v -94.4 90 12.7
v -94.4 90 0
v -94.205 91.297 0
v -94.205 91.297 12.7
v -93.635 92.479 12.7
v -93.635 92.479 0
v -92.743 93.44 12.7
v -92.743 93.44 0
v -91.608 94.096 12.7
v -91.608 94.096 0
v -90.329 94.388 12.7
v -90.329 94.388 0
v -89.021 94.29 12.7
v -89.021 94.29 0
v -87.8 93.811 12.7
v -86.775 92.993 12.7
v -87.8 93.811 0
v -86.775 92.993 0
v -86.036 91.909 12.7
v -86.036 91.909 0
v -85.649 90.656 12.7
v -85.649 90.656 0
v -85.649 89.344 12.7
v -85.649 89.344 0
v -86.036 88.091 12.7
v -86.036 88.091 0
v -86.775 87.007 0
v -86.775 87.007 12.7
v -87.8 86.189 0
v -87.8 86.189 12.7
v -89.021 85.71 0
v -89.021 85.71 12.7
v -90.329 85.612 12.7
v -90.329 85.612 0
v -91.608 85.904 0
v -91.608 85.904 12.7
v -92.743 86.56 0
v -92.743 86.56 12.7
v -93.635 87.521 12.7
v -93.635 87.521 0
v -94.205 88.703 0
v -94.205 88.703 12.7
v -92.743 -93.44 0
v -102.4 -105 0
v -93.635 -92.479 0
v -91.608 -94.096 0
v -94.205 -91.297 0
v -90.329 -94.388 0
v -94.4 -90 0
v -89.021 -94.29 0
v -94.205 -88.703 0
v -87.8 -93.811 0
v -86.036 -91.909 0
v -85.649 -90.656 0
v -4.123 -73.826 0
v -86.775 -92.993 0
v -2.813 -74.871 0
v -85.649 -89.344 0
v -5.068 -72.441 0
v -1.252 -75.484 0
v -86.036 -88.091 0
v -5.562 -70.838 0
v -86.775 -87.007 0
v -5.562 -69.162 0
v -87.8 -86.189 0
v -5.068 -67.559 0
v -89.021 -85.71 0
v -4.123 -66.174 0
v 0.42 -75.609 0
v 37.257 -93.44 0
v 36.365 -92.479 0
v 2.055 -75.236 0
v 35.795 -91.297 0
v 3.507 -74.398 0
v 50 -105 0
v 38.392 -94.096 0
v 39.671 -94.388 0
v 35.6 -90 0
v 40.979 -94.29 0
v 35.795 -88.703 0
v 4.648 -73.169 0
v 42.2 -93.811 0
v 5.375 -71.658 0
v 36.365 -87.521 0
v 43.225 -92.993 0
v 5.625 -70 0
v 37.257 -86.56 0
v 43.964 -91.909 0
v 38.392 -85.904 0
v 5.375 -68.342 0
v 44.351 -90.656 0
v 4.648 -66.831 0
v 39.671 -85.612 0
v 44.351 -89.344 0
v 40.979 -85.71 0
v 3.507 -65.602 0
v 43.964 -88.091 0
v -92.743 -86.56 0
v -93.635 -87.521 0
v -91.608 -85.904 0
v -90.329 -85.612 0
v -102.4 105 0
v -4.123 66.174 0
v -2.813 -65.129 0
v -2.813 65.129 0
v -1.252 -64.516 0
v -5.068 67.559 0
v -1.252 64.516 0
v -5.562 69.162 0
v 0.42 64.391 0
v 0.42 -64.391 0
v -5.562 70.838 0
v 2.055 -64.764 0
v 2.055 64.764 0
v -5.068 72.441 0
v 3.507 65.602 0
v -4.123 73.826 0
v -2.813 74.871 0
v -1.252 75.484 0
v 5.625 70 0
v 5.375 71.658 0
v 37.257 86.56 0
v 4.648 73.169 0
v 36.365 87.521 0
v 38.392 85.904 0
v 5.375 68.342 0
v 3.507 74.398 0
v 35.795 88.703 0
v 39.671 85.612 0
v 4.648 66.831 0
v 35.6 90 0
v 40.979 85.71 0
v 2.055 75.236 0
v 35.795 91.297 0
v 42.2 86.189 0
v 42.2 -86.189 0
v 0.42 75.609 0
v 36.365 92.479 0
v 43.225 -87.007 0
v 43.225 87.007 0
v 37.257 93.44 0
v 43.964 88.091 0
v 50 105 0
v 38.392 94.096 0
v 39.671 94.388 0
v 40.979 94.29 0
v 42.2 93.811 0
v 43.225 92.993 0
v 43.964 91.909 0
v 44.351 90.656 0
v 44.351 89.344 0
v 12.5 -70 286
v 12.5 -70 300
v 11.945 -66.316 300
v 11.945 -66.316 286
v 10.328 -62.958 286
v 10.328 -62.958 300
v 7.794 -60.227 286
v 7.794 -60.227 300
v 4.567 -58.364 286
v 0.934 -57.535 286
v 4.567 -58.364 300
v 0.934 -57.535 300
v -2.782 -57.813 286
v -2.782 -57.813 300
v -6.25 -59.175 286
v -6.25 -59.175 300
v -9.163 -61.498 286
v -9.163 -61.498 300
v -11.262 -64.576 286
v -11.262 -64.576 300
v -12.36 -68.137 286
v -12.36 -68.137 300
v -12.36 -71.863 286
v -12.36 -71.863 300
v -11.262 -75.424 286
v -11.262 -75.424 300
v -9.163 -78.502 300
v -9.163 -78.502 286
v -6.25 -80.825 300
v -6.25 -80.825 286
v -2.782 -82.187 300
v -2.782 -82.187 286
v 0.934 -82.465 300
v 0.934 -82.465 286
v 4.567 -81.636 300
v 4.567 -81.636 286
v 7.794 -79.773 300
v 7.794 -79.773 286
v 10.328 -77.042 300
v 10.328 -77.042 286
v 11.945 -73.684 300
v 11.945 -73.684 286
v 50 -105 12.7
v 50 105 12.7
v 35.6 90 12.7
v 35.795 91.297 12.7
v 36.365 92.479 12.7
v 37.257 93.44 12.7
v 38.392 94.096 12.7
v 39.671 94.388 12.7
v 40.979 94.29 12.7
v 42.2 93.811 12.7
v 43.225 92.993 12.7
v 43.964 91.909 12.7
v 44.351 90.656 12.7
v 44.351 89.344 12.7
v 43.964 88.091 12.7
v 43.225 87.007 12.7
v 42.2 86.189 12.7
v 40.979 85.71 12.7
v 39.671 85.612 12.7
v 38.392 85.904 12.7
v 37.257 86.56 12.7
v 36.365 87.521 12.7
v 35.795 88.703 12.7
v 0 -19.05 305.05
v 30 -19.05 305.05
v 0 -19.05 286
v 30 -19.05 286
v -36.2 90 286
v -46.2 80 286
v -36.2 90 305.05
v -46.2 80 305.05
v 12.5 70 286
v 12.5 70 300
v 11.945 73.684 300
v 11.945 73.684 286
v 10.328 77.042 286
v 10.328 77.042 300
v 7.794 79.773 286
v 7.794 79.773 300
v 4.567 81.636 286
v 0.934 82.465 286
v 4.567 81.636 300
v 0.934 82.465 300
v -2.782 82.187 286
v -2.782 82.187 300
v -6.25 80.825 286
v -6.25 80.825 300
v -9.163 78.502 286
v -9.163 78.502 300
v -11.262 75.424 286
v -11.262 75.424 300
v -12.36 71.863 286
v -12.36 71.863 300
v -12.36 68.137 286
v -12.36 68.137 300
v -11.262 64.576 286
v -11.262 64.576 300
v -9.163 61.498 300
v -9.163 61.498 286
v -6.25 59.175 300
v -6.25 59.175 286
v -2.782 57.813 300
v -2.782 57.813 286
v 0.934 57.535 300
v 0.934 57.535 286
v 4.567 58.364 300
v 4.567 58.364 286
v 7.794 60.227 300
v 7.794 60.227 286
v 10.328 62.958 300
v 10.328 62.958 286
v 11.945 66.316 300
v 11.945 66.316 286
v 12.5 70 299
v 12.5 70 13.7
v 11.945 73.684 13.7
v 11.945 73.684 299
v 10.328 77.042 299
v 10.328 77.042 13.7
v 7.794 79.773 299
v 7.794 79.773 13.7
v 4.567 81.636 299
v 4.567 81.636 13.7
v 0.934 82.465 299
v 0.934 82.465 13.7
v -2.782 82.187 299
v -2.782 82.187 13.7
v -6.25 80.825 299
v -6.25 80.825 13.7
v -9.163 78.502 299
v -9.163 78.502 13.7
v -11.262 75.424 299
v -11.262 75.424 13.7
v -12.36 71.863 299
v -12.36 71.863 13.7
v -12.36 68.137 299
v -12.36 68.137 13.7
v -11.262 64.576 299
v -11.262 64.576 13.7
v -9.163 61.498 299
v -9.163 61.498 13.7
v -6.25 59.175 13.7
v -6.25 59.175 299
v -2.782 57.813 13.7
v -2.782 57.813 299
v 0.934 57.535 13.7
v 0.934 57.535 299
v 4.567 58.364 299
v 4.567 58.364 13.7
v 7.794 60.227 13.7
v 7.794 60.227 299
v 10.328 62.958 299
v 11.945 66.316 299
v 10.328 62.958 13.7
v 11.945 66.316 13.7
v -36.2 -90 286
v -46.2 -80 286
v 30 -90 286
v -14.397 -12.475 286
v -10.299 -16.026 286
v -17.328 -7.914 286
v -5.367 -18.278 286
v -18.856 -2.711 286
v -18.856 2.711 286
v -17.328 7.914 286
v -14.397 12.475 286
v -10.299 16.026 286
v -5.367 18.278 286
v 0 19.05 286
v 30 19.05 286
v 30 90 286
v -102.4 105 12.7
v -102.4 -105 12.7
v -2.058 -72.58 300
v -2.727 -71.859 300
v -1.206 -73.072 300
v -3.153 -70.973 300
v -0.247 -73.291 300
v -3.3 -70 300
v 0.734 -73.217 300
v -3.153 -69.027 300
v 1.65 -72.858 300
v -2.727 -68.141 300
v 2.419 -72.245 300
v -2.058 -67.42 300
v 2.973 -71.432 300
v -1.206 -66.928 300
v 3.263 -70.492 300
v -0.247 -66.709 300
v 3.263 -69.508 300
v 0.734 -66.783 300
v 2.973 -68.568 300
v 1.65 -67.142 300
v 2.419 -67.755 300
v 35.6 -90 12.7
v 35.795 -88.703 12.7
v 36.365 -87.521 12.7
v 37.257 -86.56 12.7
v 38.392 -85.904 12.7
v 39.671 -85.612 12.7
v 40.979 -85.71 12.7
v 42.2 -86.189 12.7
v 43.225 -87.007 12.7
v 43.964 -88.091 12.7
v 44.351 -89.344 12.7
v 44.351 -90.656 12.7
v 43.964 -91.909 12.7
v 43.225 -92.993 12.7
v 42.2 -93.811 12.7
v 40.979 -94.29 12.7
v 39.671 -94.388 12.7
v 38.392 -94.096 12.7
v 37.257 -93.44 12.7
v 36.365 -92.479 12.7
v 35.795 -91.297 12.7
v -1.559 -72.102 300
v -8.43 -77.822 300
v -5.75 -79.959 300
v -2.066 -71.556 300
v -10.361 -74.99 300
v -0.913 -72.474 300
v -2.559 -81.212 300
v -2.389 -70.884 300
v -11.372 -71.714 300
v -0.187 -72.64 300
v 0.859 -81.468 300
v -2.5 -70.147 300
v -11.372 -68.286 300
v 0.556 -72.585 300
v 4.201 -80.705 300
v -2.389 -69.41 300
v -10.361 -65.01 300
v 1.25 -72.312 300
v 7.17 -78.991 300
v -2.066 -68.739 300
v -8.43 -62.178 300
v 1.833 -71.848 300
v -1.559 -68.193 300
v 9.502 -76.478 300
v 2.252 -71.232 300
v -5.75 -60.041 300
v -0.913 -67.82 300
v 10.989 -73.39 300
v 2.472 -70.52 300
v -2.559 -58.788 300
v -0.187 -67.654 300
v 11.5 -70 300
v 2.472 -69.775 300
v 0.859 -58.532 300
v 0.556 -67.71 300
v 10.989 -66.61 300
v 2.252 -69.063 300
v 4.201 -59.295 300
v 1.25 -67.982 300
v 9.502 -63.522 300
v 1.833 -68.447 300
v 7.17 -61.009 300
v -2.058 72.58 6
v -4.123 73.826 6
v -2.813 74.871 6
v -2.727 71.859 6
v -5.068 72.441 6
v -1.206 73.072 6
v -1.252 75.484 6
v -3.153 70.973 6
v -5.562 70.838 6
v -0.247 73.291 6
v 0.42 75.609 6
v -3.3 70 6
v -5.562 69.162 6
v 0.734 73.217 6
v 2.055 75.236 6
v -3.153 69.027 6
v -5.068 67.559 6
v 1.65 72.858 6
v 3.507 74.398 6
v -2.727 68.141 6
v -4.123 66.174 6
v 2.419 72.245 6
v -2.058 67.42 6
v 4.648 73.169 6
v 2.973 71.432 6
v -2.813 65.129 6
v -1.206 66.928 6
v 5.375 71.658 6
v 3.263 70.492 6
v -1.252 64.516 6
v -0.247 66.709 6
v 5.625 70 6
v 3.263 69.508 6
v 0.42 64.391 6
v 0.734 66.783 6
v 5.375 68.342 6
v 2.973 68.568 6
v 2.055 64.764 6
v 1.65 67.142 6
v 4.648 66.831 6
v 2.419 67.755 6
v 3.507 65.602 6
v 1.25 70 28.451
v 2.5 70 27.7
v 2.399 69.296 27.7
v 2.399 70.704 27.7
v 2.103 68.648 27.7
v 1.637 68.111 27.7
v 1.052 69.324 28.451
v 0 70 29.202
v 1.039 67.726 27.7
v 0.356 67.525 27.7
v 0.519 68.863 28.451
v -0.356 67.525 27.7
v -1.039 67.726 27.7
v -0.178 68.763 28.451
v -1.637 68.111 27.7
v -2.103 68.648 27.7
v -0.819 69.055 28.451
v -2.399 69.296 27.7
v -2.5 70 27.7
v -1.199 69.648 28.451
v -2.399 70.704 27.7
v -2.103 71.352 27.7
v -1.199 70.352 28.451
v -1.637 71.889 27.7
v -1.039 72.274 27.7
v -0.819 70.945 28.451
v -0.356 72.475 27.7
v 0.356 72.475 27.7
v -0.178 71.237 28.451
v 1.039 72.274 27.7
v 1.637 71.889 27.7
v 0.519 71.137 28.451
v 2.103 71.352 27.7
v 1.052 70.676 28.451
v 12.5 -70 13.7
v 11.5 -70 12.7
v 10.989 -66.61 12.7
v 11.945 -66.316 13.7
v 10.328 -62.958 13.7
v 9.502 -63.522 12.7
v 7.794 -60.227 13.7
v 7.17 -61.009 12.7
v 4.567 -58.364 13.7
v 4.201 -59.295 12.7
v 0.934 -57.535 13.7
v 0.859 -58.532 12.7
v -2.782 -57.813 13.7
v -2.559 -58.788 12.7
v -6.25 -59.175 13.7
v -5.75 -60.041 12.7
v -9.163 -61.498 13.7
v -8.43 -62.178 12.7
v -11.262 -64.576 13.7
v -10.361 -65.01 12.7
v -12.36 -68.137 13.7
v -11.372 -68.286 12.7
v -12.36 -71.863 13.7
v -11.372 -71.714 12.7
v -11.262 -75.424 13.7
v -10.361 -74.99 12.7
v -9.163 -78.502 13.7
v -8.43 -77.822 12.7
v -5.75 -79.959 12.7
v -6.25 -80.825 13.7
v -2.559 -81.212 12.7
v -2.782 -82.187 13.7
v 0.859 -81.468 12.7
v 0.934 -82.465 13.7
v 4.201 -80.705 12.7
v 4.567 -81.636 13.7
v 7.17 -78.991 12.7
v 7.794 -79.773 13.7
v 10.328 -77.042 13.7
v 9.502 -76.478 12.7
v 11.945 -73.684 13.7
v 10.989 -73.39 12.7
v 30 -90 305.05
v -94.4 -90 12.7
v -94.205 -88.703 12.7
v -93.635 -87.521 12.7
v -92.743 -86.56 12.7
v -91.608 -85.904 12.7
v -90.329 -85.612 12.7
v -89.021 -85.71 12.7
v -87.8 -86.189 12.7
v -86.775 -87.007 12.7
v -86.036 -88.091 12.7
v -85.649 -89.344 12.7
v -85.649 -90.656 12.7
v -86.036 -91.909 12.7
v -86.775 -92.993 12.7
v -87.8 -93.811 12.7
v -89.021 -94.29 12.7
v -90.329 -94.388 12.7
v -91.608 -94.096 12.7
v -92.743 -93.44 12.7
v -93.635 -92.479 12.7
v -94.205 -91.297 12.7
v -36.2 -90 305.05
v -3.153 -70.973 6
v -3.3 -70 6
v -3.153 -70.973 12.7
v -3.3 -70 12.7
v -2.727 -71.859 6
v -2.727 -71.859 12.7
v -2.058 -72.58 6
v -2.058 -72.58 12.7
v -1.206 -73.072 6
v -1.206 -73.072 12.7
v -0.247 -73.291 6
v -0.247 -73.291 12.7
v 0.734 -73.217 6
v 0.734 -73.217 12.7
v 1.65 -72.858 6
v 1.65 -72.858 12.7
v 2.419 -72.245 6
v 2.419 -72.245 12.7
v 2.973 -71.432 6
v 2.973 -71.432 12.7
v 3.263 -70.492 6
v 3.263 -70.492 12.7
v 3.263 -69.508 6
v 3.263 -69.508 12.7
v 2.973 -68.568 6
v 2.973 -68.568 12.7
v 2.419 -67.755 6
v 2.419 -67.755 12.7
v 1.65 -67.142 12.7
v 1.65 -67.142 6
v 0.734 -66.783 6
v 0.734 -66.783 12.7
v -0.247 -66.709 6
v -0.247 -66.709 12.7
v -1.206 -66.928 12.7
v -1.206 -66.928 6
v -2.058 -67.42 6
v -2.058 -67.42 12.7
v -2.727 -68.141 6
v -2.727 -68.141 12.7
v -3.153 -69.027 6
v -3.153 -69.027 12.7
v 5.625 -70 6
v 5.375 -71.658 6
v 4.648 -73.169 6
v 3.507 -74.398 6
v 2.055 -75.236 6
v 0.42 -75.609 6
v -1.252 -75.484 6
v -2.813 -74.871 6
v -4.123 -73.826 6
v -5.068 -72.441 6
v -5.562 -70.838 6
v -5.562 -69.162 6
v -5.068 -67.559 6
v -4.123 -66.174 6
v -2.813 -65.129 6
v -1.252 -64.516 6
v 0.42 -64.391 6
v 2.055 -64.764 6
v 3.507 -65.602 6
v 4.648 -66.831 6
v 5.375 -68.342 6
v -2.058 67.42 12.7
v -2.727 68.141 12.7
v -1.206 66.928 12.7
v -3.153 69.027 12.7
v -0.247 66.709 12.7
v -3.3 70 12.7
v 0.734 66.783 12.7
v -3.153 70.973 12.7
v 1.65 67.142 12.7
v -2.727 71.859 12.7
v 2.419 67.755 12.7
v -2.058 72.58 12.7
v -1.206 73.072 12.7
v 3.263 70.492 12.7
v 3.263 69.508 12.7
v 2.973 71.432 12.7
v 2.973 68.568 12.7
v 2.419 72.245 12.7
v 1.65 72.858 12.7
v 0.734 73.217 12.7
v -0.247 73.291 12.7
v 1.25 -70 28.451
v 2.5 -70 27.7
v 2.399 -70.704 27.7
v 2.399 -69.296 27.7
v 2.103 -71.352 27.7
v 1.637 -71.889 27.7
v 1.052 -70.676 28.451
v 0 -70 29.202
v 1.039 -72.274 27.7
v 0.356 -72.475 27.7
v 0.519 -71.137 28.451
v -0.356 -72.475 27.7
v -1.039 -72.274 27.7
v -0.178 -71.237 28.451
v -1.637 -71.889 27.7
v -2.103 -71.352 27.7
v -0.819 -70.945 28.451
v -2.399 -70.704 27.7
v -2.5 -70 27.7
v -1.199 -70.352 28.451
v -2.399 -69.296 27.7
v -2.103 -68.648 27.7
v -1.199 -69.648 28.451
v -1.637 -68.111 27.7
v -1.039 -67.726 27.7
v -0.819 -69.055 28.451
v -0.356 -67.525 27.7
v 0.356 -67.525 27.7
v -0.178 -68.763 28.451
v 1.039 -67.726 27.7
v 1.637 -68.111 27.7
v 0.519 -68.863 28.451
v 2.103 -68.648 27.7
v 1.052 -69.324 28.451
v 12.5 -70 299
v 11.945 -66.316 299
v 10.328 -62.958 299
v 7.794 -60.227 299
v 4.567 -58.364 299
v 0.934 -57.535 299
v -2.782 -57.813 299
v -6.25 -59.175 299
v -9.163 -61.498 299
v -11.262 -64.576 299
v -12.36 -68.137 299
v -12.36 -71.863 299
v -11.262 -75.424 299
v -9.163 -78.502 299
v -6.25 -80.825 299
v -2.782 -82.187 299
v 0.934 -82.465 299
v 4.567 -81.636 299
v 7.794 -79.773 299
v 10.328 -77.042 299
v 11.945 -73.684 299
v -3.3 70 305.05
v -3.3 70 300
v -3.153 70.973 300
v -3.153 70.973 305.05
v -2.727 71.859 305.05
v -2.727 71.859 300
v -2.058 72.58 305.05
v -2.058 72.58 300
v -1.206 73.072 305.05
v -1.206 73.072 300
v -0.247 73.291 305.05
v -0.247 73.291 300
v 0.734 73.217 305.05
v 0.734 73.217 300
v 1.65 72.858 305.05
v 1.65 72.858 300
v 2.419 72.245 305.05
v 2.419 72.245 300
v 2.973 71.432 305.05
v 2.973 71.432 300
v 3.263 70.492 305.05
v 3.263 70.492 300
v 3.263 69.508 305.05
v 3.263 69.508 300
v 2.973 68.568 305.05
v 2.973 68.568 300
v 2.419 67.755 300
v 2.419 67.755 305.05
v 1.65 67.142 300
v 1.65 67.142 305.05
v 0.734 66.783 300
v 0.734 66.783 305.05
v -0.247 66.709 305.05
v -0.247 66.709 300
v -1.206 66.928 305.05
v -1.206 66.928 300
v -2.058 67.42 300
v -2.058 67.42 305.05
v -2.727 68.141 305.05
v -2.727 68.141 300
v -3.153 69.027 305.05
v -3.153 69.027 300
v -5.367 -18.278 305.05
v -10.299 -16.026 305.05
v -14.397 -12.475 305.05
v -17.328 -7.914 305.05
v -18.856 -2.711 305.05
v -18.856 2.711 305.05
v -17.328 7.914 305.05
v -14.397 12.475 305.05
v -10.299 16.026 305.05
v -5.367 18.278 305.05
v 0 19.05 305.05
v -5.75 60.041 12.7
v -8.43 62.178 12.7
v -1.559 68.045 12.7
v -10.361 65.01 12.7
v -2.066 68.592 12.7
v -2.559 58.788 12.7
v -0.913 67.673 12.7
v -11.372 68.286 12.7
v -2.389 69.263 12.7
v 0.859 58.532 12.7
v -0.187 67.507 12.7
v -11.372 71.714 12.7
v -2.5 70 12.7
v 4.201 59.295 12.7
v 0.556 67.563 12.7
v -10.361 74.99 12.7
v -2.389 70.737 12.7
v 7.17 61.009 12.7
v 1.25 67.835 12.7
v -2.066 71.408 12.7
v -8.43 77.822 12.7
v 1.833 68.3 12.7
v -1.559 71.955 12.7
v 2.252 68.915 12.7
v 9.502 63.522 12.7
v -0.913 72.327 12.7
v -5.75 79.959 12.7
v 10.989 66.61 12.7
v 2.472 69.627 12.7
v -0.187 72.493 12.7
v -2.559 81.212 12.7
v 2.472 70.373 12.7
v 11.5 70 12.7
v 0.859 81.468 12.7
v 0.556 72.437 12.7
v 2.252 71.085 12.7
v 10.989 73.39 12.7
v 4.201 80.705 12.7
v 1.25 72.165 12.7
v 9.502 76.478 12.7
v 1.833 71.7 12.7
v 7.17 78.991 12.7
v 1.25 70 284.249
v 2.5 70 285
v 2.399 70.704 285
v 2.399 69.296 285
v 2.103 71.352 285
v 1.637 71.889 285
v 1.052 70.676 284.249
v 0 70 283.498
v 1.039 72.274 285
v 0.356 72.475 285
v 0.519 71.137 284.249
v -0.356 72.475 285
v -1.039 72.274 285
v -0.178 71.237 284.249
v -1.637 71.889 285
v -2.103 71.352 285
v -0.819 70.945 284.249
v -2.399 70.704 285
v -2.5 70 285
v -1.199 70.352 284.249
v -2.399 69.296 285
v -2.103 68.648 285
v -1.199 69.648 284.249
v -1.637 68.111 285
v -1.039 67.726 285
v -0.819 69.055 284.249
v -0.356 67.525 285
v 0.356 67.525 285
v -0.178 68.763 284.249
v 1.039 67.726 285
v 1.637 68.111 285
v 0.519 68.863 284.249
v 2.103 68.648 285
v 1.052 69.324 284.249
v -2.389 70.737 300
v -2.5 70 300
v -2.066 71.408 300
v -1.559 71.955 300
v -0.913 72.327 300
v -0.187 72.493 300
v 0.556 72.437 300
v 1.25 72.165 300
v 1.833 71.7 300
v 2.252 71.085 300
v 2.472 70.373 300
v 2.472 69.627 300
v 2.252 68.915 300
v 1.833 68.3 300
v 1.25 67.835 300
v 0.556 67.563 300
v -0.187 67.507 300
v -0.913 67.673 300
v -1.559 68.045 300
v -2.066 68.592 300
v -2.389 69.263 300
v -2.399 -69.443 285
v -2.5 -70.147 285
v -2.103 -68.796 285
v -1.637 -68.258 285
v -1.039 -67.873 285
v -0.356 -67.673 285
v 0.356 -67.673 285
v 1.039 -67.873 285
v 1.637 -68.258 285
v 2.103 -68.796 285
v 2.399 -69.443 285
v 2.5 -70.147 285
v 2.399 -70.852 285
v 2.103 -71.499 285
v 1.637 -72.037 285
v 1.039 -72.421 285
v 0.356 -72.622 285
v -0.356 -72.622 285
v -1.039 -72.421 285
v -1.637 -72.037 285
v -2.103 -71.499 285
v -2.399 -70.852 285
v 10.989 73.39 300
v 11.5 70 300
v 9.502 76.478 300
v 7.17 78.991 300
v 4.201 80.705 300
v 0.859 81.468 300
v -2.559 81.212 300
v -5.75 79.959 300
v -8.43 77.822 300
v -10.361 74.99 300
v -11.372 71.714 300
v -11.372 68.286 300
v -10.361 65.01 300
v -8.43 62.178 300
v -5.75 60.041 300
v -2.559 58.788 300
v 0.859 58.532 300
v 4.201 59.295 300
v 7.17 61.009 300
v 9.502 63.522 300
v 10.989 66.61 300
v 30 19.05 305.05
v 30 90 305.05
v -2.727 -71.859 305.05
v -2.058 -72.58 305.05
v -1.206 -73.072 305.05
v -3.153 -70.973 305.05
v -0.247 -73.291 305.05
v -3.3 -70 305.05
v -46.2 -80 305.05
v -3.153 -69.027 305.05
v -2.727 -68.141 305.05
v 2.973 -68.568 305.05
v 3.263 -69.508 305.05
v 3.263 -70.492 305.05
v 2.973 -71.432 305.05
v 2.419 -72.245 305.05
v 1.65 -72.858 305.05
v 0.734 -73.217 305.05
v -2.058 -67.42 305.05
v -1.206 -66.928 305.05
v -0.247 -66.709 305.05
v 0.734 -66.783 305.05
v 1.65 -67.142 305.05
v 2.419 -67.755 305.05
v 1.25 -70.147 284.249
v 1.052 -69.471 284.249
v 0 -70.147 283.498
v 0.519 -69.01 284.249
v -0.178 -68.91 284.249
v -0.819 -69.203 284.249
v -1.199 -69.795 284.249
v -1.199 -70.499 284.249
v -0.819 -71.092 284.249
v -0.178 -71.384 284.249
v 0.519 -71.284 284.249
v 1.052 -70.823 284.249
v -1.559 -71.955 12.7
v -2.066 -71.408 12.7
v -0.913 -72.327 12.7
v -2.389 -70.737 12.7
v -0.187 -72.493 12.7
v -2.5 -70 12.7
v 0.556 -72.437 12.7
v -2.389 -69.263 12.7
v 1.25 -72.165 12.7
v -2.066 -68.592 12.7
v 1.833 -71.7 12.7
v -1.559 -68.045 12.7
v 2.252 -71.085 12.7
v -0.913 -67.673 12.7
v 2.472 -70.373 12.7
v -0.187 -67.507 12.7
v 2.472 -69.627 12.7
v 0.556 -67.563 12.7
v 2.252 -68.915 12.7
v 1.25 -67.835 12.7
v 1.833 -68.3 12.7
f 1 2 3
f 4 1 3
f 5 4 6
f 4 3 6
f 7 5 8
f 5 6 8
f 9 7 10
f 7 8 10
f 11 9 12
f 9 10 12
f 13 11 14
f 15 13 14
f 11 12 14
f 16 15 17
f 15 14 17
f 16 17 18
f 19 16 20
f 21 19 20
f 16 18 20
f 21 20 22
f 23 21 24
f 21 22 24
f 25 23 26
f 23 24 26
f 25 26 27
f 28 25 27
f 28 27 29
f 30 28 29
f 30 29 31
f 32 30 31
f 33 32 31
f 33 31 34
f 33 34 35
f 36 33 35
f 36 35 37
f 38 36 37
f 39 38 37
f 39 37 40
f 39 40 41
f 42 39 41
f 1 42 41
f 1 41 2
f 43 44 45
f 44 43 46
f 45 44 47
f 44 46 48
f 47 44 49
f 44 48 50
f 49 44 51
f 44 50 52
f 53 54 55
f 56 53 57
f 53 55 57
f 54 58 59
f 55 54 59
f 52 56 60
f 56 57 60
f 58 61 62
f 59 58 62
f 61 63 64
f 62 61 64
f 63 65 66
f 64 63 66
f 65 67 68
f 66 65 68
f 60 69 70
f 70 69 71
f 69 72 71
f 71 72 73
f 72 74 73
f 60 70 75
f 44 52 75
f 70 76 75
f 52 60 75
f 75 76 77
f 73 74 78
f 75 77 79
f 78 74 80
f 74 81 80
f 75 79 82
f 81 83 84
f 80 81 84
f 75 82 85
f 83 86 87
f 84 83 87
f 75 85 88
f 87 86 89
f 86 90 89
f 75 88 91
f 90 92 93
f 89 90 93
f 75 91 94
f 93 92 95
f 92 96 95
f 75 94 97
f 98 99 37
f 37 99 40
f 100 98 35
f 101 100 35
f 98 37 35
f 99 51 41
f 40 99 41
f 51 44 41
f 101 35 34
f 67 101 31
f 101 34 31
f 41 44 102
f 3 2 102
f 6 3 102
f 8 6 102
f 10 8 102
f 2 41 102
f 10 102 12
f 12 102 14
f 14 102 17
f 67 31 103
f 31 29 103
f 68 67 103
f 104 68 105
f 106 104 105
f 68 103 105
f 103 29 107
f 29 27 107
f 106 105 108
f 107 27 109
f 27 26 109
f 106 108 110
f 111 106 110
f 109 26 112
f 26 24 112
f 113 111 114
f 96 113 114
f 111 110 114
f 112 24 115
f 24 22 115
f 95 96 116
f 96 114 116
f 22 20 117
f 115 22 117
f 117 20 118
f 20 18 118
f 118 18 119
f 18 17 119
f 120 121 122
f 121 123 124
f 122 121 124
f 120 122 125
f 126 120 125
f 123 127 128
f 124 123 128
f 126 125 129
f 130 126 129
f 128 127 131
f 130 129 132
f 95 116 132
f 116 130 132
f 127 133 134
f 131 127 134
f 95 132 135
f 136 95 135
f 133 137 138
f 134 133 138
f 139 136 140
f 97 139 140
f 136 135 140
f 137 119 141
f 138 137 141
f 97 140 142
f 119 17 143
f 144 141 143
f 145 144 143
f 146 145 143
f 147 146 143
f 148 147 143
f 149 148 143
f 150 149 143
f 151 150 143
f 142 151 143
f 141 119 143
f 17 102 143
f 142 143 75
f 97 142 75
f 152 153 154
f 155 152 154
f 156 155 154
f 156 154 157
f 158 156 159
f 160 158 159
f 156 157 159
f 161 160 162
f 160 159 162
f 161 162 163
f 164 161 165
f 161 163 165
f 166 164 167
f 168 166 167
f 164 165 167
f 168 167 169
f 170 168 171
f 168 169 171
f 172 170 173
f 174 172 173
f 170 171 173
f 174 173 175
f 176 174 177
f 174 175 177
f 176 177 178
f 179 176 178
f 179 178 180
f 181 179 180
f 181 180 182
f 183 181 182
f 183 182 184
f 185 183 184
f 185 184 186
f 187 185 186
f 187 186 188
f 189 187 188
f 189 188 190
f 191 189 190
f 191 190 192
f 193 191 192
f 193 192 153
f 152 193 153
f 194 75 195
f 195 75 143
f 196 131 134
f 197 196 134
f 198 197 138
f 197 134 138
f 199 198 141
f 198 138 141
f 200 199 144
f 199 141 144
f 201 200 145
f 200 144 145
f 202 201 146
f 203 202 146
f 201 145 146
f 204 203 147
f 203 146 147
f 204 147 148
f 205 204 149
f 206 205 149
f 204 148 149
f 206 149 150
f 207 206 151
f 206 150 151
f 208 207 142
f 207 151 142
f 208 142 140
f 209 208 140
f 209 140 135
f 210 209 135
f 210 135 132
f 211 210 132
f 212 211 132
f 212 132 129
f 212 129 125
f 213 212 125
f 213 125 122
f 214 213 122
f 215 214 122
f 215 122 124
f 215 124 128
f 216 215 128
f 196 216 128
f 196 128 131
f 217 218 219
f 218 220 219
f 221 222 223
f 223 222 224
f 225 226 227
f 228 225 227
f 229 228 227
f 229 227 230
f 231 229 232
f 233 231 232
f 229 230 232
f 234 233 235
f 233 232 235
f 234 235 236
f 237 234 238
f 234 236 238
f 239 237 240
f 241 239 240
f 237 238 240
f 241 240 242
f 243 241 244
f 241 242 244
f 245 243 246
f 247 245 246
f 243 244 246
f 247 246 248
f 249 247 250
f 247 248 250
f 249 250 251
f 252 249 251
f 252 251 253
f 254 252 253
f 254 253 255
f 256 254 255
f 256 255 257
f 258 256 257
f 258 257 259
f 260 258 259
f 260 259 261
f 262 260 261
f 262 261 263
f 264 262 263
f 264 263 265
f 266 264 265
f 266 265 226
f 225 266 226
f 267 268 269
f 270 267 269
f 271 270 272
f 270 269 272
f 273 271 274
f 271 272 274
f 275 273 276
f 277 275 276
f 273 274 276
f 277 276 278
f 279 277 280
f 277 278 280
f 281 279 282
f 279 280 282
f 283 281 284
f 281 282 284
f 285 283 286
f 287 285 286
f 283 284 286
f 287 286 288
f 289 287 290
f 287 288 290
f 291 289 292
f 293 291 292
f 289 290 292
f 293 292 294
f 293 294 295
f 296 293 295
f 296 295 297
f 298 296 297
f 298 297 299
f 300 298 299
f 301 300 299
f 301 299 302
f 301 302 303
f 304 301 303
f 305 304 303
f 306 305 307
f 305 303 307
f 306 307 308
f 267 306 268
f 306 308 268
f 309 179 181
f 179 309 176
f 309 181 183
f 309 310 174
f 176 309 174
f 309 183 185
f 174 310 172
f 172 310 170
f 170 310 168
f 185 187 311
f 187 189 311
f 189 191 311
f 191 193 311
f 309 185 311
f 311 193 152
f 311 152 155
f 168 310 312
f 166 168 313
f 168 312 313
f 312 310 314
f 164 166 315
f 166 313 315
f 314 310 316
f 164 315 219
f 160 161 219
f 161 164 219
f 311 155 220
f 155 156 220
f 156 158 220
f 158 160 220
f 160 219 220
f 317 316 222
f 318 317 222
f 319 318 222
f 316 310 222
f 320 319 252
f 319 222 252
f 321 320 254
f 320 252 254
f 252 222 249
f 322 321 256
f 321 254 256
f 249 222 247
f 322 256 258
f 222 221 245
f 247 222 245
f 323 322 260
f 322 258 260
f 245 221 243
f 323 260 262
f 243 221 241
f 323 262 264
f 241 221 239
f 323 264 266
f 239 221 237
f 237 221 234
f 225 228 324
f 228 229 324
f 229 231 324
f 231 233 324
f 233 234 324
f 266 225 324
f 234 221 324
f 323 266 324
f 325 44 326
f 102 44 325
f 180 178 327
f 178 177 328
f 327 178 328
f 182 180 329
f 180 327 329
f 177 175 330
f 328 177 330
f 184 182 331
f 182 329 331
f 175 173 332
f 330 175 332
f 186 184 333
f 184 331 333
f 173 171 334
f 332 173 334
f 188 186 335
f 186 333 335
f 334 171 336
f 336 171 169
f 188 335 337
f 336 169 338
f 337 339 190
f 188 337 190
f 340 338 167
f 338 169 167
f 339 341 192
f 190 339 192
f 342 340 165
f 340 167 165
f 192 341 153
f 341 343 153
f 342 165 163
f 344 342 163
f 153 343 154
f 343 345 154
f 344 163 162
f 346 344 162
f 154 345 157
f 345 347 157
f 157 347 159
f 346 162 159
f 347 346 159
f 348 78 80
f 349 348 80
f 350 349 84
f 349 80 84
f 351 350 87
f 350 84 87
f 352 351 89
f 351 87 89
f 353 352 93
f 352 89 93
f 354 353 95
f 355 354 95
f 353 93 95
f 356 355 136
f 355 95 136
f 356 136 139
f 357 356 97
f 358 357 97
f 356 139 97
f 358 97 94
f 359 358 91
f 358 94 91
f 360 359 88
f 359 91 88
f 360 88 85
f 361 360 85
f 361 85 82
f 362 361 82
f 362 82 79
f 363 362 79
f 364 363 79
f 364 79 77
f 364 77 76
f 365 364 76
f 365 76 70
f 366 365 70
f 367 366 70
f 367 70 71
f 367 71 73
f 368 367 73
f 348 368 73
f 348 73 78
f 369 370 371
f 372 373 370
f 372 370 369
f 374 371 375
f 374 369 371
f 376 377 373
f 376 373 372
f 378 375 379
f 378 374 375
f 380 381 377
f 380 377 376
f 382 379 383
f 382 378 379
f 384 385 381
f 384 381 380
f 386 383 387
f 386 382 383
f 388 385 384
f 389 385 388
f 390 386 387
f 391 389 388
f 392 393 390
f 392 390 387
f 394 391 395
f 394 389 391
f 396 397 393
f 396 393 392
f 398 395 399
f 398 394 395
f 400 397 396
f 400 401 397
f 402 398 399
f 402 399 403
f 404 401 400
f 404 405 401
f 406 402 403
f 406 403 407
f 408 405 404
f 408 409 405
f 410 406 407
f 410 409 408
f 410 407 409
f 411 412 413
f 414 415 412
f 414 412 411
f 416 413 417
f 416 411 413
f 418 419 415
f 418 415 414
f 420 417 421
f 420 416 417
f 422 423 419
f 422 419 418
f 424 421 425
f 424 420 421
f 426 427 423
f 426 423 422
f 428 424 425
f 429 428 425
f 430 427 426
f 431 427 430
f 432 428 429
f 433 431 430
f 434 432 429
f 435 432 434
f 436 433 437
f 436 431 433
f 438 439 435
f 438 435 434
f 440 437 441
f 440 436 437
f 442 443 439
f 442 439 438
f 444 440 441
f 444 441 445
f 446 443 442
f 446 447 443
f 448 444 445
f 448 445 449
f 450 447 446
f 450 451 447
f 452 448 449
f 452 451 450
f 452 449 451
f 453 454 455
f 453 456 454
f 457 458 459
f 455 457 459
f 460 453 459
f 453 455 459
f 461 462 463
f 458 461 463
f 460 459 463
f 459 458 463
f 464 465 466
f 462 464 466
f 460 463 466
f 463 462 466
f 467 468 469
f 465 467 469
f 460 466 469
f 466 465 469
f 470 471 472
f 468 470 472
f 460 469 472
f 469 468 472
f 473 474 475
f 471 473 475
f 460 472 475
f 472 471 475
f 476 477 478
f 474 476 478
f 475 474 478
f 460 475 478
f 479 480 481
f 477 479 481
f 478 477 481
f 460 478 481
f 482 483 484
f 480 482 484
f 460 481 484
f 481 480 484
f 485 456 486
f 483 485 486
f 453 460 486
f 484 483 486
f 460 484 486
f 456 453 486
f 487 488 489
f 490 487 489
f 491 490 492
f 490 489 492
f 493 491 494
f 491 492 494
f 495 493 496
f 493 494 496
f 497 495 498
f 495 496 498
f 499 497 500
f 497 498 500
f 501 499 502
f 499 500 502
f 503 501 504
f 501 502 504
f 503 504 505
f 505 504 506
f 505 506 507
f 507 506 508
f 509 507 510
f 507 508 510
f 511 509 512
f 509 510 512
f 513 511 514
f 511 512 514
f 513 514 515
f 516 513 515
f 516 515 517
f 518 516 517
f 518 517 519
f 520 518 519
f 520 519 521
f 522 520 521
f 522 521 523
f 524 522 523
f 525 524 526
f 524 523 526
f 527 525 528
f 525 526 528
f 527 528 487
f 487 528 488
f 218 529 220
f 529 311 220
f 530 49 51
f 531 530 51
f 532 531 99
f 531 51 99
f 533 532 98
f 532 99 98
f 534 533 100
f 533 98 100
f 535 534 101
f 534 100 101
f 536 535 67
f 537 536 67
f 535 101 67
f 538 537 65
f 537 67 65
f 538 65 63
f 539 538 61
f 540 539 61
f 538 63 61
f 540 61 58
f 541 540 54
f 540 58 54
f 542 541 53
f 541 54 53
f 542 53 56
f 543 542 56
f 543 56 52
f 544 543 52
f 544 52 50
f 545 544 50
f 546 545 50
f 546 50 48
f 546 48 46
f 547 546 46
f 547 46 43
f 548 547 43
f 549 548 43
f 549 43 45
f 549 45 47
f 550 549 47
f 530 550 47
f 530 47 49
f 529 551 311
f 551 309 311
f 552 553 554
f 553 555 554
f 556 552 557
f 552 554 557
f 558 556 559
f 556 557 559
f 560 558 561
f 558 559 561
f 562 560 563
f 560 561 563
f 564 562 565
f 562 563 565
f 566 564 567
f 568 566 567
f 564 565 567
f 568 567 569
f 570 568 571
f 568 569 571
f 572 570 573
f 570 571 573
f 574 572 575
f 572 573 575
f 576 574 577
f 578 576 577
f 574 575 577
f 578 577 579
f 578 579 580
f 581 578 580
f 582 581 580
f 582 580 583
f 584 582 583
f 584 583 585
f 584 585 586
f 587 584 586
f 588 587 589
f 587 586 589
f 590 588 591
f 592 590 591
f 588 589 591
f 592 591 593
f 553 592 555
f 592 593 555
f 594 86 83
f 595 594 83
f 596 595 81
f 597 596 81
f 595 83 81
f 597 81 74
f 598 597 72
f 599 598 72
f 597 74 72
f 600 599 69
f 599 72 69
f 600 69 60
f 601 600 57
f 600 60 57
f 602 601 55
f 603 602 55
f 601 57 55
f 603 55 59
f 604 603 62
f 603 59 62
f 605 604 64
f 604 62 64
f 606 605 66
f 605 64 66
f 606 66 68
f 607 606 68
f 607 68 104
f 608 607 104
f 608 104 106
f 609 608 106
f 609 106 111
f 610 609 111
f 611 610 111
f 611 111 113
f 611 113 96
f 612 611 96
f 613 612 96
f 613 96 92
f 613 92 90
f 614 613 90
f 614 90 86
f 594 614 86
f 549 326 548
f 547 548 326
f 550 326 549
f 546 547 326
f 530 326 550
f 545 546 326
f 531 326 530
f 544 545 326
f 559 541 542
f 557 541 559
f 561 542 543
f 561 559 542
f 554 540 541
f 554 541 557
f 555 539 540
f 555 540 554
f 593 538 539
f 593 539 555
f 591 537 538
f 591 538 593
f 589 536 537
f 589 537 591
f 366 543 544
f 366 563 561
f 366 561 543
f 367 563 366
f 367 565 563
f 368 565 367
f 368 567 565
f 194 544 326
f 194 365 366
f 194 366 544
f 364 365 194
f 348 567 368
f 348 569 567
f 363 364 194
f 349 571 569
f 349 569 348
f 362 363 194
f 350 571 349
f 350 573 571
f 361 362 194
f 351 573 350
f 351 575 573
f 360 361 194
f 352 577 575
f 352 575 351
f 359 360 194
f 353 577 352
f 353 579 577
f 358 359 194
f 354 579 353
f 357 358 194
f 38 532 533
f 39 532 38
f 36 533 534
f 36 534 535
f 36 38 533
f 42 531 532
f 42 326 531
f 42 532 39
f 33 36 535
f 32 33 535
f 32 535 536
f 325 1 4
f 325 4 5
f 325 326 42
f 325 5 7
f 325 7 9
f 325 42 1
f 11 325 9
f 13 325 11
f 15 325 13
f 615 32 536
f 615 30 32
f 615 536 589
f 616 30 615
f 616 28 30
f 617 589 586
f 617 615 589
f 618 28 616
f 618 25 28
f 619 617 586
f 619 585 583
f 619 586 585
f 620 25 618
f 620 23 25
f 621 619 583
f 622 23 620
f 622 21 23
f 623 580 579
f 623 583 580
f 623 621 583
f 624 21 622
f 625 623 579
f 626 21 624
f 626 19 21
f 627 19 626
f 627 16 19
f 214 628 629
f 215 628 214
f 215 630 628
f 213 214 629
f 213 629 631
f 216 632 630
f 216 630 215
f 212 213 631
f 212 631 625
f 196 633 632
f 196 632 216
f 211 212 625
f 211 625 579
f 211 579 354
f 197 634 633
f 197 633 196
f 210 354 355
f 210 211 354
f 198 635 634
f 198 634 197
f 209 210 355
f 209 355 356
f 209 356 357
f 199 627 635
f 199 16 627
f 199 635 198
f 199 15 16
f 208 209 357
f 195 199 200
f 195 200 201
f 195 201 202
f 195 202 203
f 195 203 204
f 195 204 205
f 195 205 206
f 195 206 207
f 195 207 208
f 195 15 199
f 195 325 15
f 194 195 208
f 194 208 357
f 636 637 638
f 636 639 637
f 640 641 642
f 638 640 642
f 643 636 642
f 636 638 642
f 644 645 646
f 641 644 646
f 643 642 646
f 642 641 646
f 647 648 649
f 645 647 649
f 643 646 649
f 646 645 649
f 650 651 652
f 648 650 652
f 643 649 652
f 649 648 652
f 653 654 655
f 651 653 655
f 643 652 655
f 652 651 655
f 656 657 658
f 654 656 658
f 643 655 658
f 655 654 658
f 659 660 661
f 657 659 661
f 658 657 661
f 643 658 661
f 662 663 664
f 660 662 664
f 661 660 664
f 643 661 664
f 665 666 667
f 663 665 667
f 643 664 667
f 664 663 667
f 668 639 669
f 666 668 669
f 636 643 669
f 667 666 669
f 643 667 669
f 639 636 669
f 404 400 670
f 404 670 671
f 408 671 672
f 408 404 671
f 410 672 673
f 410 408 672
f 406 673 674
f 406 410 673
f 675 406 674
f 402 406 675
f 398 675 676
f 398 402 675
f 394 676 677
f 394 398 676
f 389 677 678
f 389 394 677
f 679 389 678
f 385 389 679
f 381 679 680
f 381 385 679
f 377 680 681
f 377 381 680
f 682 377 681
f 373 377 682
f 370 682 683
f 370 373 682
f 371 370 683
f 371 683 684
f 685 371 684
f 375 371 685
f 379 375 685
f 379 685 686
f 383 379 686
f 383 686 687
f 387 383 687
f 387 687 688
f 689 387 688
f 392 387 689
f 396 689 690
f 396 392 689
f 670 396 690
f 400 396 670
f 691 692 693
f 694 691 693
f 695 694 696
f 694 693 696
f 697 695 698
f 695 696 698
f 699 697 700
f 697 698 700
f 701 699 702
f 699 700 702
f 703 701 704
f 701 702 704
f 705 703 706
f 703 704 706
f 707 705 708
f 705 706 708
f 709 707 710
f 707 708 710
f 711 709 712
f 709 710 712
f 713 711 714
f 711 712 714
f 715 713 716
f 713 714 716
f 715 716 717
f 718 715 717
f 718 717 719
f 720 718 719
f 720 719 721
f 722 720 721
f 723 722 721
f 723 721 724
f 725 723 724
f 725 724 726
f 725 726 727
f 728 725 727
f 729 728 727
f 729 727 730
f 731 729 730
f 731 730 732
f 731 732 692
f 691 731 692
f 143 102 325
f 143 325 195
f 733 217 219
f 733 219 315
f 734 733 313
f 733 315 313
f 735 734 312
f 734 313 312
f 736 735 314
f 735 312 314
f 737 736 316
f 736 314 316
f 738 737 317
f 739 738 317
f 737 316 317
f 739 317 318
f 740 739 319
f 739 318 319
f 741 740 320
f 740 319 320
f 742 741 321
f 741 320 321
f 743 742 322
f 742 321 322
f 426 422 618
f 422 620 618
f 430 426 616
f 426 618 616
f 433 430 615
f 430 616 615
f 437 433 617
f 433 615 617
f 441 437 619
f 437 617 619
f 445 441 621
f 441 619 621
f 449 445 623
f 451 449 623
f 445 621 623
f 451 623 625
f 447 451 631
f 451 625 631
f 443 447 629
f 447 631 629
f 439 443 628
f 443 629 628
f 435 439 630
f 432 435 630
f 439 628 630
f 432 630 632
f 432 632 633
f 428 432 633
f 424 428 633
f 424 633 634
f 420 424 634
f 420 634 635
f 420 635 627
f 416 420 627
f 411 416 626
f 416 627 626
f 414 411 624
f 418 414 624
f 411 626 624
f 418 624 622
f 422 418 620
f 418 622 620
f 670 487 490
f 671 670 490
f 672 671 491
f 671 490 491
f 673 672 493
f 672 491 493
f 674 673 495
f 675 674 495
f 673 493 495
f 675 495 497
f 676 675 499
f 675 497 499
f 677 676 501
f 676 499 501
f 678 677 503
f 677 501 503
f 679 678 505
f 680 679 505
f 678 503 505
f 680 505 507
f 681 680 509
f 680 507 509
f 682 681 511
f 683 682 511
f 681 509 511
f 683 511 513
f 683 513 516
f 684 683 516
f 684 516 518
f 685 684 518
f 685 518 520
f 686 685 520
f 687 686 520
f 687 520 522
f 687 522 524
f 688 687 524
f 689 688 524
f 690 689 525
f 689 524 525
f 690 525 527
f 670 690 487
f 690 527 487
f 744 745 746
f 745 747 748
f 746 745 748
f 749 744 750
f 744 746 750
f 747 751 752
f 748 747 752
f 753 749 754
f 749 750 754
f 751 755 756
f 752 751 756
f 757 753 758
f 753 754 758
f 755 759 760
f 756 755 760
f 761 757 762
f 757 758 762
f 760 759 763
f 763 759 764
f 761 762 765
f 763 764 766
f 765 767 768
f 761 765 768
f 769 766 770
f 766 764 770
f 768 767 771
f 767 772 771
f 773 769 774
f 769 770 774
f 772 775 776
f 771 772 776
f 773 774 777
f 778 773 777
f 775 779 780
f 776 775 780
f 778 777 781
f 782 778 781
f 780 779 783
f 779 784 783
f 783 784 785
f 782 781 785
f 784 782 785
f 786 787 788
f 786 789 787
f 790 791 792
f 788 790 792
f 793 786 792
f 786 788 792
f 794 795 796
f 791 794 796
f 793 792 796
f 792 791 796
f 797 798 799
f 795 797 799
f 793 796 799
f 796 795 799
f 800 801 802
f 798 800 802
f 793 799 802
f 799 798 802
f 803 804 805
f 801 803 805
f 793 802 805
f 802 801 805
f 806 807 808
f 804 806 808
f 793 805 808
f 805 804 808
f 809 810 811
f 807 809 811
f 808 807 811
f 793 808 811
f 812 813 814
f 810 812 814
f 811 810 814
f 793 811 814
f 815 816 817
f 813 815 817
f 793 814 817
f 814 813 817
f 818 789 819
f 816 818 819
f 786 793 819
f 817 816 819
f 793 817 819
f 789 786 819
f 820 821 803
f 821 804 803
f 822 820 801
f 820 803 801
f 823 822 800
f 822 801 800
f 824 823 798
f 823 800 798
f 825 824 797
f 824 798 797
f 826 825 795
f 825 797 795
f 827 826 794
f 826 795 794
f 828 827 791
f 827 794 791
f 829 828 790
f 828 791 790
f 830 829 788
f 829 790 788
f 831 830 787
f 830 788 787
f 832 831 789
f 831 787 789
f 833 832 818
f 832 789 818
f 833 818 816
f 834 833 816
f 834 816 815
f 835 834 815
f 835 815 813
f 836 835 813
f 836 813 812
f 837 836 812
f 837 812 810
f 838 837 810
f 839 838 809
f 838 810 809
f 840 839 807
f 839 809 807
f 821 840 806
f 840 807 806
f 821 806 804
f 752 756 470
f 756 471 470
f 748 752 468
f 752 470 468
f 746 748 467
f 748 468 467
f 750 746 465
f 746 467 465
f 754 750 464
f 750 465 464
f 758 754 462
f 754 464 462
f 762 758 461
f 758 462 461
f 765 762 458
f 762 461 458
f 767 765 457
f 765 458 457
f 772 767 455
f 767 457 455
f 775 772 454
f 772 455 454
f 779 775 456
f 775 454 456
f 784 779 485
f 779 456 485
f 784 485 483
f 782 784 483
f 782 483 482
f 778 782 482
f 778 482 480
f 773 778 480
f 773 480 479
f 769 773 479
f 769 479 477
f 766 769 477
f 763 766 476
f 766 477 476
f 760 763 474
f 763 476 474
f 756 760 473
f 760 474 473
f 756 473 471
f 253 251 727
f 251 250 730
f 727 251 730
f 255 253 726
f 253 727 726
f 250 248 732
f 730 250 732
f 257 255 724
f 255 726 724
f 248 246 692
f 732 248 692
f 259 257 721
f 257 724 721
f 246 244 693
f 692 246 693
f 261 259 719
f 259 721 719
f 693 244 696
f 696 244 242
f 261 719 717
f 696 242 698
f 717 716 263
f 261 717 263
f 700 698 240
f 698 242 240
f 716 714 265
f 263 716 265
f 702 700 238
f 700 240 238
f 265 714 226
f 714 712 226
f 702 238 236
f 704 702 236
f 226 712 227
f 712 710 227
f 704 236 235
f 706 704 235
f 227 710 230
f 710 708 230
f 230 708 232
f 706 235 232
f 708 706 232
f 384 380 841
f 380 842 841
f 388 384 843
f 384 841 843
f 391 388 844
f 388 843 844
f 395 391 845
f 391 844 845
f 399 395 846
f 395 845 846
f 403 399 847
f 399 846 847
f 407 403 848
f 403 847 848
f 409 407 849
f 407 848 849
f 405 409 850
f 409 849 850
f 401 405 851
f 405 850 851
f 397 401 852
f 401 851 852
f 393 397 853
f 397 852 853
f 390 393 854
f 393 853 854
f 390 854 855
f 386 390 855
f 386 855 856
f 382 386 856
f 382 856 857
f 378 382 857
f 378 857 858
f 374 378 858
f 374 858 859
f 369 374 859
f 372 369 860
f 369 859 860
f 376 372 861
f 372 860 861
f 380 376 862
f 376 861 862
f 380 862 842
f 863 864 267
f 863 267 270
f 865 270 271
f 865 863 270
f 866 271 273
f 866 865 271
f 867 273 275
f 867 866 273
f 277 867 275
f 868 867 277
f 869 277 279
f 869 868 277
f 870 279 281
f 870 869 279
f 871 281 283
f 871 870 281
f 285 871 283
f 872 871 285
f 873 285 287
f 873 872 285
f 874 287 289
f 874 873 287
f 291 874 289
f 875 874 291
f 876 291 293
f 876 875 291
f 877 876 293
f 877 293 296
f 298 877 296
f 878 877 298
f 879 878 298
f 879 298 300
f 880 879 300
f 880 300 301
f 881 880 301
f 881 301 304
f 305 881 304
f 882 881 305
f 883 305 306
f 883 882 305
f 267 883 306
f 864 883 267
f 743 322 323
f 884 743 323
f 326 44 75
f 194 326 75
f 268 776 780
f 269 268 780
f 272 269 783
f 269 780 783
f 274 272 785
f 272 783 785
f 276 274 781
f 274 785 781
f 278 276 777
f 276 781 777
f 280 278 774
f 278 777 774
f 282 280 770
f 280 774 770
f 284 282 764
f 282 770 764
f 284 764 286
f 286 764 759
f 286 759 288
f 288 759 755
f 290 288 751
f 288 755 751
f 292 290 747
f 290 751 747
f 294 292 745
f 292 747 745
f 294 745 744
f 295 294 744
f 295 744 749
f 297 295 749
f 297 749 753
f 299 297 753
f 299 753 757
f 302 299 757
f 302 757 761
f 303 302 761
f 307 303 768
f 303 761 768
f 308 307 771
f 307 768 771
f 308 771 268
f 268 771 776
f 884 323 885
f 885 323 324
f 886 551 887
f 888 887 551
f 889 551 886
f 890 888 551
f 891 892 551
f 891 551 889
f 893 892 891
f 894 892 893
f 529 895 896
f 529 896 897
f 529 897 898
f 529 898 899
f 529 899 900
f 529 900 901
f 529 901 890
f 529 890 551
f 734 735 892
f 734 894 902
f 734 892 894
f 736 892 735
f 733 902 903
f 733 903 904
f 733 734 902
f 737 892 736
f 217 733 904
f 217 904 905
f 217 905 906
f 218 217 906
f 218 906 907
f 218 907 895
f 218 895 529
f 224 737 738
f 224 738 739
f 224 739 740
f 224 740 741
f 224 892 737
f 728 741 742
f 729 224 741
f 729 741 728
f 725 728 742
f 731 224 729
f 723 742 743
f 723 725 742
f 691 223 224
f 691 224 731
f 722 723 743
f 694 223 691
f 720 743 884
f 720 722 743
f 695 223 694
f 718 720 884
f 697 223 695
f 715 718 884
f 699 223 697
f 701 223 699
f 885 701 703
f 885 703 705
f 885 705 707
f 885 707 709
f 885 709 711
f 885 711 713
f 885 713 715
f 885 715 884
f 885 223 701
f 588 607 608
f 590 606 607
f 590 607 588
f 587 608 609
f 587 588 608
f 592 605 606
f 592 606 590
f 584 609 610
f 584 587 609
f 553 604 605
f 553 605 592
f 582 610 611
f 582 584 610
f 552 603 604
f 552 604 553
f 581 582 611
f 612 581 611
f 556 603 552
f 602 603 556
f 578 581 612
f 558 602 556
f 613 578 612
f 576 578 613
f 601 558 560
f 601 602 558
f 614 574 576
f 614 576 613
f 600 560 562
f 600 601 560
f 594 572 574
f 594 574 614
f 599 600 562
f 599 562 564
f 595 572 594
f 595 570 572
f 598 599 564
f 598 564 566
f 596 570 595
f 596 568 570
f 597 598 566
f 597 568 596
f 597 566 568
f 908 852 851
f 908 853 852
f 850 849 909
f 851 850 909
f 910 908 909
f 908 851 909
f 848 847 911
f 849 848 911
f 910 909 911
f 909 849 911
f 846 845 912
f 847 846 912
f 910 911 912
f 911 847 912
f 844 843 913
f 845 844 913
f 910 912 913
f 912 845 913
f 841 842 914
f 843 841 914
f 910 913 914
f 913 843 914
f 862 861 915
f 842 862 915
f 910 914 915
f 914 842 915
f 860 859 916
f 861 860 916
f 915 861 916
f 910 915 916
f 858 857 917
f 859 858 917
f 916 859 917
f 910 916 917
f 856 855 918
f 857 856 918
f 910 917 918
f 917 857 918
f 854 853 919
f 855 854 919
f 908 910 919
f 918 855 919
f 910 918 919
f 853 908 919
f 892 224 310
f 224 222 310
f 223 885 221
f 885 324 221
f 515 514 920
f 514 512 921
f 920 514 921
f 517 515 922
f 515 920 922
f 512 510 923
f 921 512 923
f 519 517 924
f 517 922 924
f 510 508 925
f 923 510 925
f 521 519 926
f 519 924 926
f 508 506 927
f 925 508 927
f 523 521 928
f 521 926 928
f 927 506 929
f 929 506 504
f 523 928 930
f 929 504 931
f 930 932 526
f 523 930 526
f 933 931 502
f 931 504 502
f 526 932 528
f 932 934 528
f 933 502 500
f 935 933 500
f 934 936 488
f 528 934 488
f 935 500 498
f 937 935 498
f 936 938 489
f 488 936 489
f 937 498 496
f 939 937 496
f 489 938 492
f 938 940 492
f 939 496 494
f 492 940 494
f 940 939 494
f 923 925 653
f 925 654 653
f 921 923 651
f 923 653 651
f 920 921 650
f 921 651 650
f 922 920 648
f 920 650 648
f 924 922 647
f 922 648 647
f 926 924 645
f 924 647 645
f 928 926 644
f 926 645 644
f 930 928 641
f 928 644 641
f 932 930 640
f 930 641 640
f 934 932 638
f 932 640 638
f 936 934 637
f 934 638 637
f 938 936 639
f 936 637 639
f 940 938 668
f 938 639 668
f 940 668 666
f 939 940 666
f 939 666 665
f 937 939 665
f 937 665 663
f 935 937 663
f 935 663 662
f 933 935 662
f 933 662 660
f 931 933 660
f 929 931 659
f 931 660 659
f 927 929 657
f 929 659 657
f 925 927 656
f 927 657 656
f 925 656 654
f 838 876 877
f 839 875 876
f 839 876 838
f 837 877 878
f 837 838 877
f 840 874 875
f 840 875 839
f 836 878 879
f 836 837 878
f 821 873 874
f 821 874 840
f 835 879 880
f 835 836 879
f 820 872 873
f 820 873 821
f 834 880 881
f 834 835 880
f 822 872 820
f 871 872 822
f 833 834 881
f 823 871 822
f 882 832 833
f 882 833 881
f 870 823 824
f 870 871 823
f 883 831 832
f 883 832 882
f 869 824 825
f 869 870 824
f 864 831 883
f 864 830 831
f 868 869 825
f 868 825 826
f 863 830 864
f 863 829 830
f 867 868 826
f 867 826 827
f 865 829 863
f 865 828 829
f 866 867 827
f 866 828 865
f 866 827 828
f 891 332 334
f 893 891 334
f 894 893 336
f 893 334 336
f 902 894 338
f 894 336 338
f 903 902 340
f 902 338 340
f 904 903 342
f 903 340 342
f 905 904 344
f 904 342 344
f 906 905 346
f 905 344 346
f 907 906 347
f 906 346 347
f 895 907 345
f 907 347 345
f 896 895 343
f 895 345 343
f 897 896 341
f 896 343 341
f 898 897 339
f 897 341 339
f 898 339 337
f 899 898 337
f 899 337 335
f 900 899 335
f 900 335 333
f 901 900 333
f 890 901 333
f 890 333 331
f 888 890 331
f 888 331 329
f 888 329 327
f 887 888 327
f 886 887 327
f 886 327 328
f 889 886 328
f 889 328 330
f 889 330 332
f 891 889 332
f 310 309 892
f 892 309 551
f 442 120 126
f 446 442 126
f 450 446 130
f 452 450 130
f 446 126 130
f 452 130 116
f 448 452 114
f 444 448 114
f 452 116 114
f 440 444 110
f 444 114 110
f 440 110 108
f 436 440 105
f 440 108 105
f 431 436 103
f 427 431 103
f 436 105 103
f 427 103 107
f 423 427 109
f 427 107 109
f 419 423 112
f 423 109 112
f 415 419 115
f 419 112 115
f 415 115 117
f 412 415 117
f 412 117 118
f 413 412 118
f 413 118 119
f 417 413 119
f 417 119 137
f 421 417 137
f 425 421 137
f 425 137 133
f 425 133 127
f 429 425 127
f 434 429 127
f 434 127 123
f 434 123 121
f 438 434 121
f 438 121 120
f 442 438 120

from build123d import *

# Parameters (mm, degrees)
F2_W            = 152.4
F2_H            = 210
F4_DEPTH        = 12.7
F5_R            = 12.5
F6_DEPTH        = 287.3
F7_DEPTH        = 287.3
F8_SIZE         = 1
F9_SIZE         = 1
F10_D           = 5
F10_DEPTH       = 15
F10_TIP         = 1.5021515476
F11_D           = 5
F11_DEPTH       = 15
F11_TIP         = 1.5021515476
F12_D           = 6.6
F12_DEPTH       = 15
F12_CBORE_D     = 11.25
F12_CBORE_DEPTH = 6
F12_TIP         = 1.9828400428
F14_D           = 5
F14_DEPTH       = 15
F14_TIP         = 1.5021515476
F14_2_D         = 5
F14_2_DEPTH     = 15
F14_2_TIP       = 1.5021515476
F15_DEPTH       = 14
F15_DEPTH_BACK  = 5.05
F16_R           = 12.5
F17_DEPTH       = 300.001
F19_D           = 6.6
F20_SIZE        = 10
F22_D           = 8.8


with BuildPart() as f4:
    # F2 (on Top) → F4 (new body, through all)
    with BuildSketch(Plane.XY):
        with Locations((-26.2, 0)):
            Rectangle(F2_W, F2_H)
    extrude(amount=F4_DEPTH)

    # F12
    with Locations(Plane(origin=(0, 0, 0), x_dir=(1, 0, 0), z_dir=(0, 0, -1))):
        with Locations((0, 70), (0, -70)):
            CounterBoreHole(F12_D / 2, F12_CBORE_D / 2, F12_CBORE_DEPTH, depth=F12_DEPTH)
            with Locations((0, 0, -(F12_DEPTH + F12_TIP / 2))):  # 118° drill point
                Cone(0, F12_D / 2, F12_TIP, mode=Mode.SUBTRACT)

    # F22 (through all)
    with Locations(Plane.XY.offset(12.7)):
        with Locations((-90, 90), (-90, -90), (40, -90), (40, 90)):
            Hole(F22_D / 2)


with BuildPart() as f6:
    # F5 (on offset) → F6 (new body, through all)
    with BuildSketch(Plane.XY.offset(12.7)):
        with Locations((0, 70)):
            Circle(F5_R)
    extrude(amount=F6_DEPTH)

    # F8
    f8_edges = [f6.edges().sort_by_distance(p)[0] for p in [
        (-12.5, 70, 12.7),
        (-12.5, 70, 300),
    ]]
    chamfer(f8_edges, length=F8_SIZE)

    # F10
    with Locations(Plane(origin=(0, 0, 12.7), x_dir=(1, 0, 0), z_dir=(0, 0, -1))):
        with Locations((0, -70)):
            Hole(F10_D / 2, depth=F10_DEPTH)
            with Locations((0, 0, -(F10_DEPTH + F10_TIP / 2))):  # 118° drill point
                Cone(0, F10_D / 2, F10_TIP, mode=Mode.SUBTRACT)

    # F14
    with Locations(Plane.XY.offset(300)):
        with Locations((0, -70.14721632), (0, 70)):
            Hole(F14_D / 2, depth=F14_DEPTH)
            with Locations((0, 0, -(F14_DEPTH + F14_TIP / 2))):  # 118° drill point
                Cone(0, F14_D / 2, F14_TIP, mode=Mode.SUBTRACT)


with BuildPart() as f7:
    # F5 (on offset) → F7 (new body, through all)
    with BuildSketch(Plane.XY.offset(12.7)):
        with Locations((0, -70)):
            Circle(F5_R)
    extrude(amount=F7_DEPTH)

    # F9
    f9_edges = [f7.edges().sort_by_distance(p)[0] for p in [
        (-12.5, -70, 12.7),
        (-12.5, -70, 300),
    ]]
    chamfer(f9_edges, length=F9_SIZE)

    # F11
    with Locations(Plane(origin=(0, 0, 12.7), x_dir=(1, 0, 0), z_dir=(0, 0, -1))):
        with Locations((0, 70)):
            Hole(F11_D / 2, depth=F11_DEPTH)
            with Locations((0, 0, -(F11_DEPTH + F11_TIP / 2))):  # 118° drill point
                Cone(0, F11_D / 2, F11_TIP, mode=Mode.SUBTRACT)

    # F14#2
    with Locations(Plane.XY.offset(300)):
        with Locations((0, -70.14721632), (0, 70)):
            Hole(F14_2_D / 2, depth=F14_2_DEPTH)
            with Locations((0, 0, -(F14_2_DEPTH + F14_2_TIP / 2))):  # 118° drill point
                Cone(0, F14_2_D / 2, F14_2_TIP, mode=Mode.SUBTRACT)


with BuildPart() as f15:
    # F3 (on offset) → F15 (new body, two sides)
    with BuildSketch(Plane.XY.offset(300)) as f15_sk:
        with BuildLine():
            Line((30, 19.05), (30, 90))
            Line((30, 90), (-46.2, 90))
            Line((-46.2, 90), (-46.2, -90))
            Line((-46.2, -90), (30, -90))
            Line((30, -90), (30, -19.05))
            Line((30, -19.05), (0, -19.05))
            ThreePointArc((0, -19.05), (-19.05, 0), (0, 19.05))
            Line((0, 19.05), (30, 19.05))
        make_face()
    extrude(amount=-F15_DEPTH)
    extrude(f15_sk.sketch, amount=F15_DEPTH_BACK)

    # F16 (on offset) + F15_face (on face) → F17 (cut, through all)
    with BuildSketch(Plane.XY.offset(300)):
        with Locations((0, -70)):
            Circle(F16_R)
        with Locations((0, 70)):
            Circle(F16_R)
    with BuildSketch(Plane(origin=(-10.3004424881, 0, 286), x_dir=(1, 0, 0), z_dir=(0, 0, -1))):
        with BuildLine():
            Line((40.3004424881, -90), (40.3004424881, -19.05))
            Line((40.3004424881, -19.05), (10.3004424881, -19.05))
            ThreePointArc((10.3004424881, -19.05), (-8.7495575119, 0), (10.3004424881, 19.05))
            Line((10.3004424881, 19.05), (40.3004424881, 19.05))
            Line((40.3004424881, 19.05), (40.3004424881, 90))
            Line((40.3004424881, 90), (-35.8995575119, 90))
            Line((-35.8995575119, 90), (-35.8995575119, -90))
            Line((-35.8995575119, -90), (40.3004424881, -90))
        make_face()
    extrude(amount=-F17_DEPTH, dir=(0, 0, 1), mode=Mode.SUBTRACT)

    # F19 (through all)
    with Locations(Plane.XY.offset(305.05)):
        with Locations((0, 70), (0, -70)):
            Hole(F19_D / 2)

    # F20
    f20_edges = [f15.edges().sort_by_distance(p)[0] for p in [
        (-46.2, 90, 295.525),
        (-46.2, -90, 295.525),
    ]]
    chamfer(f20_edges, length=F20_SIZE)


solid = Compound([f4.part, f6.part, f7.part, f15.part])
